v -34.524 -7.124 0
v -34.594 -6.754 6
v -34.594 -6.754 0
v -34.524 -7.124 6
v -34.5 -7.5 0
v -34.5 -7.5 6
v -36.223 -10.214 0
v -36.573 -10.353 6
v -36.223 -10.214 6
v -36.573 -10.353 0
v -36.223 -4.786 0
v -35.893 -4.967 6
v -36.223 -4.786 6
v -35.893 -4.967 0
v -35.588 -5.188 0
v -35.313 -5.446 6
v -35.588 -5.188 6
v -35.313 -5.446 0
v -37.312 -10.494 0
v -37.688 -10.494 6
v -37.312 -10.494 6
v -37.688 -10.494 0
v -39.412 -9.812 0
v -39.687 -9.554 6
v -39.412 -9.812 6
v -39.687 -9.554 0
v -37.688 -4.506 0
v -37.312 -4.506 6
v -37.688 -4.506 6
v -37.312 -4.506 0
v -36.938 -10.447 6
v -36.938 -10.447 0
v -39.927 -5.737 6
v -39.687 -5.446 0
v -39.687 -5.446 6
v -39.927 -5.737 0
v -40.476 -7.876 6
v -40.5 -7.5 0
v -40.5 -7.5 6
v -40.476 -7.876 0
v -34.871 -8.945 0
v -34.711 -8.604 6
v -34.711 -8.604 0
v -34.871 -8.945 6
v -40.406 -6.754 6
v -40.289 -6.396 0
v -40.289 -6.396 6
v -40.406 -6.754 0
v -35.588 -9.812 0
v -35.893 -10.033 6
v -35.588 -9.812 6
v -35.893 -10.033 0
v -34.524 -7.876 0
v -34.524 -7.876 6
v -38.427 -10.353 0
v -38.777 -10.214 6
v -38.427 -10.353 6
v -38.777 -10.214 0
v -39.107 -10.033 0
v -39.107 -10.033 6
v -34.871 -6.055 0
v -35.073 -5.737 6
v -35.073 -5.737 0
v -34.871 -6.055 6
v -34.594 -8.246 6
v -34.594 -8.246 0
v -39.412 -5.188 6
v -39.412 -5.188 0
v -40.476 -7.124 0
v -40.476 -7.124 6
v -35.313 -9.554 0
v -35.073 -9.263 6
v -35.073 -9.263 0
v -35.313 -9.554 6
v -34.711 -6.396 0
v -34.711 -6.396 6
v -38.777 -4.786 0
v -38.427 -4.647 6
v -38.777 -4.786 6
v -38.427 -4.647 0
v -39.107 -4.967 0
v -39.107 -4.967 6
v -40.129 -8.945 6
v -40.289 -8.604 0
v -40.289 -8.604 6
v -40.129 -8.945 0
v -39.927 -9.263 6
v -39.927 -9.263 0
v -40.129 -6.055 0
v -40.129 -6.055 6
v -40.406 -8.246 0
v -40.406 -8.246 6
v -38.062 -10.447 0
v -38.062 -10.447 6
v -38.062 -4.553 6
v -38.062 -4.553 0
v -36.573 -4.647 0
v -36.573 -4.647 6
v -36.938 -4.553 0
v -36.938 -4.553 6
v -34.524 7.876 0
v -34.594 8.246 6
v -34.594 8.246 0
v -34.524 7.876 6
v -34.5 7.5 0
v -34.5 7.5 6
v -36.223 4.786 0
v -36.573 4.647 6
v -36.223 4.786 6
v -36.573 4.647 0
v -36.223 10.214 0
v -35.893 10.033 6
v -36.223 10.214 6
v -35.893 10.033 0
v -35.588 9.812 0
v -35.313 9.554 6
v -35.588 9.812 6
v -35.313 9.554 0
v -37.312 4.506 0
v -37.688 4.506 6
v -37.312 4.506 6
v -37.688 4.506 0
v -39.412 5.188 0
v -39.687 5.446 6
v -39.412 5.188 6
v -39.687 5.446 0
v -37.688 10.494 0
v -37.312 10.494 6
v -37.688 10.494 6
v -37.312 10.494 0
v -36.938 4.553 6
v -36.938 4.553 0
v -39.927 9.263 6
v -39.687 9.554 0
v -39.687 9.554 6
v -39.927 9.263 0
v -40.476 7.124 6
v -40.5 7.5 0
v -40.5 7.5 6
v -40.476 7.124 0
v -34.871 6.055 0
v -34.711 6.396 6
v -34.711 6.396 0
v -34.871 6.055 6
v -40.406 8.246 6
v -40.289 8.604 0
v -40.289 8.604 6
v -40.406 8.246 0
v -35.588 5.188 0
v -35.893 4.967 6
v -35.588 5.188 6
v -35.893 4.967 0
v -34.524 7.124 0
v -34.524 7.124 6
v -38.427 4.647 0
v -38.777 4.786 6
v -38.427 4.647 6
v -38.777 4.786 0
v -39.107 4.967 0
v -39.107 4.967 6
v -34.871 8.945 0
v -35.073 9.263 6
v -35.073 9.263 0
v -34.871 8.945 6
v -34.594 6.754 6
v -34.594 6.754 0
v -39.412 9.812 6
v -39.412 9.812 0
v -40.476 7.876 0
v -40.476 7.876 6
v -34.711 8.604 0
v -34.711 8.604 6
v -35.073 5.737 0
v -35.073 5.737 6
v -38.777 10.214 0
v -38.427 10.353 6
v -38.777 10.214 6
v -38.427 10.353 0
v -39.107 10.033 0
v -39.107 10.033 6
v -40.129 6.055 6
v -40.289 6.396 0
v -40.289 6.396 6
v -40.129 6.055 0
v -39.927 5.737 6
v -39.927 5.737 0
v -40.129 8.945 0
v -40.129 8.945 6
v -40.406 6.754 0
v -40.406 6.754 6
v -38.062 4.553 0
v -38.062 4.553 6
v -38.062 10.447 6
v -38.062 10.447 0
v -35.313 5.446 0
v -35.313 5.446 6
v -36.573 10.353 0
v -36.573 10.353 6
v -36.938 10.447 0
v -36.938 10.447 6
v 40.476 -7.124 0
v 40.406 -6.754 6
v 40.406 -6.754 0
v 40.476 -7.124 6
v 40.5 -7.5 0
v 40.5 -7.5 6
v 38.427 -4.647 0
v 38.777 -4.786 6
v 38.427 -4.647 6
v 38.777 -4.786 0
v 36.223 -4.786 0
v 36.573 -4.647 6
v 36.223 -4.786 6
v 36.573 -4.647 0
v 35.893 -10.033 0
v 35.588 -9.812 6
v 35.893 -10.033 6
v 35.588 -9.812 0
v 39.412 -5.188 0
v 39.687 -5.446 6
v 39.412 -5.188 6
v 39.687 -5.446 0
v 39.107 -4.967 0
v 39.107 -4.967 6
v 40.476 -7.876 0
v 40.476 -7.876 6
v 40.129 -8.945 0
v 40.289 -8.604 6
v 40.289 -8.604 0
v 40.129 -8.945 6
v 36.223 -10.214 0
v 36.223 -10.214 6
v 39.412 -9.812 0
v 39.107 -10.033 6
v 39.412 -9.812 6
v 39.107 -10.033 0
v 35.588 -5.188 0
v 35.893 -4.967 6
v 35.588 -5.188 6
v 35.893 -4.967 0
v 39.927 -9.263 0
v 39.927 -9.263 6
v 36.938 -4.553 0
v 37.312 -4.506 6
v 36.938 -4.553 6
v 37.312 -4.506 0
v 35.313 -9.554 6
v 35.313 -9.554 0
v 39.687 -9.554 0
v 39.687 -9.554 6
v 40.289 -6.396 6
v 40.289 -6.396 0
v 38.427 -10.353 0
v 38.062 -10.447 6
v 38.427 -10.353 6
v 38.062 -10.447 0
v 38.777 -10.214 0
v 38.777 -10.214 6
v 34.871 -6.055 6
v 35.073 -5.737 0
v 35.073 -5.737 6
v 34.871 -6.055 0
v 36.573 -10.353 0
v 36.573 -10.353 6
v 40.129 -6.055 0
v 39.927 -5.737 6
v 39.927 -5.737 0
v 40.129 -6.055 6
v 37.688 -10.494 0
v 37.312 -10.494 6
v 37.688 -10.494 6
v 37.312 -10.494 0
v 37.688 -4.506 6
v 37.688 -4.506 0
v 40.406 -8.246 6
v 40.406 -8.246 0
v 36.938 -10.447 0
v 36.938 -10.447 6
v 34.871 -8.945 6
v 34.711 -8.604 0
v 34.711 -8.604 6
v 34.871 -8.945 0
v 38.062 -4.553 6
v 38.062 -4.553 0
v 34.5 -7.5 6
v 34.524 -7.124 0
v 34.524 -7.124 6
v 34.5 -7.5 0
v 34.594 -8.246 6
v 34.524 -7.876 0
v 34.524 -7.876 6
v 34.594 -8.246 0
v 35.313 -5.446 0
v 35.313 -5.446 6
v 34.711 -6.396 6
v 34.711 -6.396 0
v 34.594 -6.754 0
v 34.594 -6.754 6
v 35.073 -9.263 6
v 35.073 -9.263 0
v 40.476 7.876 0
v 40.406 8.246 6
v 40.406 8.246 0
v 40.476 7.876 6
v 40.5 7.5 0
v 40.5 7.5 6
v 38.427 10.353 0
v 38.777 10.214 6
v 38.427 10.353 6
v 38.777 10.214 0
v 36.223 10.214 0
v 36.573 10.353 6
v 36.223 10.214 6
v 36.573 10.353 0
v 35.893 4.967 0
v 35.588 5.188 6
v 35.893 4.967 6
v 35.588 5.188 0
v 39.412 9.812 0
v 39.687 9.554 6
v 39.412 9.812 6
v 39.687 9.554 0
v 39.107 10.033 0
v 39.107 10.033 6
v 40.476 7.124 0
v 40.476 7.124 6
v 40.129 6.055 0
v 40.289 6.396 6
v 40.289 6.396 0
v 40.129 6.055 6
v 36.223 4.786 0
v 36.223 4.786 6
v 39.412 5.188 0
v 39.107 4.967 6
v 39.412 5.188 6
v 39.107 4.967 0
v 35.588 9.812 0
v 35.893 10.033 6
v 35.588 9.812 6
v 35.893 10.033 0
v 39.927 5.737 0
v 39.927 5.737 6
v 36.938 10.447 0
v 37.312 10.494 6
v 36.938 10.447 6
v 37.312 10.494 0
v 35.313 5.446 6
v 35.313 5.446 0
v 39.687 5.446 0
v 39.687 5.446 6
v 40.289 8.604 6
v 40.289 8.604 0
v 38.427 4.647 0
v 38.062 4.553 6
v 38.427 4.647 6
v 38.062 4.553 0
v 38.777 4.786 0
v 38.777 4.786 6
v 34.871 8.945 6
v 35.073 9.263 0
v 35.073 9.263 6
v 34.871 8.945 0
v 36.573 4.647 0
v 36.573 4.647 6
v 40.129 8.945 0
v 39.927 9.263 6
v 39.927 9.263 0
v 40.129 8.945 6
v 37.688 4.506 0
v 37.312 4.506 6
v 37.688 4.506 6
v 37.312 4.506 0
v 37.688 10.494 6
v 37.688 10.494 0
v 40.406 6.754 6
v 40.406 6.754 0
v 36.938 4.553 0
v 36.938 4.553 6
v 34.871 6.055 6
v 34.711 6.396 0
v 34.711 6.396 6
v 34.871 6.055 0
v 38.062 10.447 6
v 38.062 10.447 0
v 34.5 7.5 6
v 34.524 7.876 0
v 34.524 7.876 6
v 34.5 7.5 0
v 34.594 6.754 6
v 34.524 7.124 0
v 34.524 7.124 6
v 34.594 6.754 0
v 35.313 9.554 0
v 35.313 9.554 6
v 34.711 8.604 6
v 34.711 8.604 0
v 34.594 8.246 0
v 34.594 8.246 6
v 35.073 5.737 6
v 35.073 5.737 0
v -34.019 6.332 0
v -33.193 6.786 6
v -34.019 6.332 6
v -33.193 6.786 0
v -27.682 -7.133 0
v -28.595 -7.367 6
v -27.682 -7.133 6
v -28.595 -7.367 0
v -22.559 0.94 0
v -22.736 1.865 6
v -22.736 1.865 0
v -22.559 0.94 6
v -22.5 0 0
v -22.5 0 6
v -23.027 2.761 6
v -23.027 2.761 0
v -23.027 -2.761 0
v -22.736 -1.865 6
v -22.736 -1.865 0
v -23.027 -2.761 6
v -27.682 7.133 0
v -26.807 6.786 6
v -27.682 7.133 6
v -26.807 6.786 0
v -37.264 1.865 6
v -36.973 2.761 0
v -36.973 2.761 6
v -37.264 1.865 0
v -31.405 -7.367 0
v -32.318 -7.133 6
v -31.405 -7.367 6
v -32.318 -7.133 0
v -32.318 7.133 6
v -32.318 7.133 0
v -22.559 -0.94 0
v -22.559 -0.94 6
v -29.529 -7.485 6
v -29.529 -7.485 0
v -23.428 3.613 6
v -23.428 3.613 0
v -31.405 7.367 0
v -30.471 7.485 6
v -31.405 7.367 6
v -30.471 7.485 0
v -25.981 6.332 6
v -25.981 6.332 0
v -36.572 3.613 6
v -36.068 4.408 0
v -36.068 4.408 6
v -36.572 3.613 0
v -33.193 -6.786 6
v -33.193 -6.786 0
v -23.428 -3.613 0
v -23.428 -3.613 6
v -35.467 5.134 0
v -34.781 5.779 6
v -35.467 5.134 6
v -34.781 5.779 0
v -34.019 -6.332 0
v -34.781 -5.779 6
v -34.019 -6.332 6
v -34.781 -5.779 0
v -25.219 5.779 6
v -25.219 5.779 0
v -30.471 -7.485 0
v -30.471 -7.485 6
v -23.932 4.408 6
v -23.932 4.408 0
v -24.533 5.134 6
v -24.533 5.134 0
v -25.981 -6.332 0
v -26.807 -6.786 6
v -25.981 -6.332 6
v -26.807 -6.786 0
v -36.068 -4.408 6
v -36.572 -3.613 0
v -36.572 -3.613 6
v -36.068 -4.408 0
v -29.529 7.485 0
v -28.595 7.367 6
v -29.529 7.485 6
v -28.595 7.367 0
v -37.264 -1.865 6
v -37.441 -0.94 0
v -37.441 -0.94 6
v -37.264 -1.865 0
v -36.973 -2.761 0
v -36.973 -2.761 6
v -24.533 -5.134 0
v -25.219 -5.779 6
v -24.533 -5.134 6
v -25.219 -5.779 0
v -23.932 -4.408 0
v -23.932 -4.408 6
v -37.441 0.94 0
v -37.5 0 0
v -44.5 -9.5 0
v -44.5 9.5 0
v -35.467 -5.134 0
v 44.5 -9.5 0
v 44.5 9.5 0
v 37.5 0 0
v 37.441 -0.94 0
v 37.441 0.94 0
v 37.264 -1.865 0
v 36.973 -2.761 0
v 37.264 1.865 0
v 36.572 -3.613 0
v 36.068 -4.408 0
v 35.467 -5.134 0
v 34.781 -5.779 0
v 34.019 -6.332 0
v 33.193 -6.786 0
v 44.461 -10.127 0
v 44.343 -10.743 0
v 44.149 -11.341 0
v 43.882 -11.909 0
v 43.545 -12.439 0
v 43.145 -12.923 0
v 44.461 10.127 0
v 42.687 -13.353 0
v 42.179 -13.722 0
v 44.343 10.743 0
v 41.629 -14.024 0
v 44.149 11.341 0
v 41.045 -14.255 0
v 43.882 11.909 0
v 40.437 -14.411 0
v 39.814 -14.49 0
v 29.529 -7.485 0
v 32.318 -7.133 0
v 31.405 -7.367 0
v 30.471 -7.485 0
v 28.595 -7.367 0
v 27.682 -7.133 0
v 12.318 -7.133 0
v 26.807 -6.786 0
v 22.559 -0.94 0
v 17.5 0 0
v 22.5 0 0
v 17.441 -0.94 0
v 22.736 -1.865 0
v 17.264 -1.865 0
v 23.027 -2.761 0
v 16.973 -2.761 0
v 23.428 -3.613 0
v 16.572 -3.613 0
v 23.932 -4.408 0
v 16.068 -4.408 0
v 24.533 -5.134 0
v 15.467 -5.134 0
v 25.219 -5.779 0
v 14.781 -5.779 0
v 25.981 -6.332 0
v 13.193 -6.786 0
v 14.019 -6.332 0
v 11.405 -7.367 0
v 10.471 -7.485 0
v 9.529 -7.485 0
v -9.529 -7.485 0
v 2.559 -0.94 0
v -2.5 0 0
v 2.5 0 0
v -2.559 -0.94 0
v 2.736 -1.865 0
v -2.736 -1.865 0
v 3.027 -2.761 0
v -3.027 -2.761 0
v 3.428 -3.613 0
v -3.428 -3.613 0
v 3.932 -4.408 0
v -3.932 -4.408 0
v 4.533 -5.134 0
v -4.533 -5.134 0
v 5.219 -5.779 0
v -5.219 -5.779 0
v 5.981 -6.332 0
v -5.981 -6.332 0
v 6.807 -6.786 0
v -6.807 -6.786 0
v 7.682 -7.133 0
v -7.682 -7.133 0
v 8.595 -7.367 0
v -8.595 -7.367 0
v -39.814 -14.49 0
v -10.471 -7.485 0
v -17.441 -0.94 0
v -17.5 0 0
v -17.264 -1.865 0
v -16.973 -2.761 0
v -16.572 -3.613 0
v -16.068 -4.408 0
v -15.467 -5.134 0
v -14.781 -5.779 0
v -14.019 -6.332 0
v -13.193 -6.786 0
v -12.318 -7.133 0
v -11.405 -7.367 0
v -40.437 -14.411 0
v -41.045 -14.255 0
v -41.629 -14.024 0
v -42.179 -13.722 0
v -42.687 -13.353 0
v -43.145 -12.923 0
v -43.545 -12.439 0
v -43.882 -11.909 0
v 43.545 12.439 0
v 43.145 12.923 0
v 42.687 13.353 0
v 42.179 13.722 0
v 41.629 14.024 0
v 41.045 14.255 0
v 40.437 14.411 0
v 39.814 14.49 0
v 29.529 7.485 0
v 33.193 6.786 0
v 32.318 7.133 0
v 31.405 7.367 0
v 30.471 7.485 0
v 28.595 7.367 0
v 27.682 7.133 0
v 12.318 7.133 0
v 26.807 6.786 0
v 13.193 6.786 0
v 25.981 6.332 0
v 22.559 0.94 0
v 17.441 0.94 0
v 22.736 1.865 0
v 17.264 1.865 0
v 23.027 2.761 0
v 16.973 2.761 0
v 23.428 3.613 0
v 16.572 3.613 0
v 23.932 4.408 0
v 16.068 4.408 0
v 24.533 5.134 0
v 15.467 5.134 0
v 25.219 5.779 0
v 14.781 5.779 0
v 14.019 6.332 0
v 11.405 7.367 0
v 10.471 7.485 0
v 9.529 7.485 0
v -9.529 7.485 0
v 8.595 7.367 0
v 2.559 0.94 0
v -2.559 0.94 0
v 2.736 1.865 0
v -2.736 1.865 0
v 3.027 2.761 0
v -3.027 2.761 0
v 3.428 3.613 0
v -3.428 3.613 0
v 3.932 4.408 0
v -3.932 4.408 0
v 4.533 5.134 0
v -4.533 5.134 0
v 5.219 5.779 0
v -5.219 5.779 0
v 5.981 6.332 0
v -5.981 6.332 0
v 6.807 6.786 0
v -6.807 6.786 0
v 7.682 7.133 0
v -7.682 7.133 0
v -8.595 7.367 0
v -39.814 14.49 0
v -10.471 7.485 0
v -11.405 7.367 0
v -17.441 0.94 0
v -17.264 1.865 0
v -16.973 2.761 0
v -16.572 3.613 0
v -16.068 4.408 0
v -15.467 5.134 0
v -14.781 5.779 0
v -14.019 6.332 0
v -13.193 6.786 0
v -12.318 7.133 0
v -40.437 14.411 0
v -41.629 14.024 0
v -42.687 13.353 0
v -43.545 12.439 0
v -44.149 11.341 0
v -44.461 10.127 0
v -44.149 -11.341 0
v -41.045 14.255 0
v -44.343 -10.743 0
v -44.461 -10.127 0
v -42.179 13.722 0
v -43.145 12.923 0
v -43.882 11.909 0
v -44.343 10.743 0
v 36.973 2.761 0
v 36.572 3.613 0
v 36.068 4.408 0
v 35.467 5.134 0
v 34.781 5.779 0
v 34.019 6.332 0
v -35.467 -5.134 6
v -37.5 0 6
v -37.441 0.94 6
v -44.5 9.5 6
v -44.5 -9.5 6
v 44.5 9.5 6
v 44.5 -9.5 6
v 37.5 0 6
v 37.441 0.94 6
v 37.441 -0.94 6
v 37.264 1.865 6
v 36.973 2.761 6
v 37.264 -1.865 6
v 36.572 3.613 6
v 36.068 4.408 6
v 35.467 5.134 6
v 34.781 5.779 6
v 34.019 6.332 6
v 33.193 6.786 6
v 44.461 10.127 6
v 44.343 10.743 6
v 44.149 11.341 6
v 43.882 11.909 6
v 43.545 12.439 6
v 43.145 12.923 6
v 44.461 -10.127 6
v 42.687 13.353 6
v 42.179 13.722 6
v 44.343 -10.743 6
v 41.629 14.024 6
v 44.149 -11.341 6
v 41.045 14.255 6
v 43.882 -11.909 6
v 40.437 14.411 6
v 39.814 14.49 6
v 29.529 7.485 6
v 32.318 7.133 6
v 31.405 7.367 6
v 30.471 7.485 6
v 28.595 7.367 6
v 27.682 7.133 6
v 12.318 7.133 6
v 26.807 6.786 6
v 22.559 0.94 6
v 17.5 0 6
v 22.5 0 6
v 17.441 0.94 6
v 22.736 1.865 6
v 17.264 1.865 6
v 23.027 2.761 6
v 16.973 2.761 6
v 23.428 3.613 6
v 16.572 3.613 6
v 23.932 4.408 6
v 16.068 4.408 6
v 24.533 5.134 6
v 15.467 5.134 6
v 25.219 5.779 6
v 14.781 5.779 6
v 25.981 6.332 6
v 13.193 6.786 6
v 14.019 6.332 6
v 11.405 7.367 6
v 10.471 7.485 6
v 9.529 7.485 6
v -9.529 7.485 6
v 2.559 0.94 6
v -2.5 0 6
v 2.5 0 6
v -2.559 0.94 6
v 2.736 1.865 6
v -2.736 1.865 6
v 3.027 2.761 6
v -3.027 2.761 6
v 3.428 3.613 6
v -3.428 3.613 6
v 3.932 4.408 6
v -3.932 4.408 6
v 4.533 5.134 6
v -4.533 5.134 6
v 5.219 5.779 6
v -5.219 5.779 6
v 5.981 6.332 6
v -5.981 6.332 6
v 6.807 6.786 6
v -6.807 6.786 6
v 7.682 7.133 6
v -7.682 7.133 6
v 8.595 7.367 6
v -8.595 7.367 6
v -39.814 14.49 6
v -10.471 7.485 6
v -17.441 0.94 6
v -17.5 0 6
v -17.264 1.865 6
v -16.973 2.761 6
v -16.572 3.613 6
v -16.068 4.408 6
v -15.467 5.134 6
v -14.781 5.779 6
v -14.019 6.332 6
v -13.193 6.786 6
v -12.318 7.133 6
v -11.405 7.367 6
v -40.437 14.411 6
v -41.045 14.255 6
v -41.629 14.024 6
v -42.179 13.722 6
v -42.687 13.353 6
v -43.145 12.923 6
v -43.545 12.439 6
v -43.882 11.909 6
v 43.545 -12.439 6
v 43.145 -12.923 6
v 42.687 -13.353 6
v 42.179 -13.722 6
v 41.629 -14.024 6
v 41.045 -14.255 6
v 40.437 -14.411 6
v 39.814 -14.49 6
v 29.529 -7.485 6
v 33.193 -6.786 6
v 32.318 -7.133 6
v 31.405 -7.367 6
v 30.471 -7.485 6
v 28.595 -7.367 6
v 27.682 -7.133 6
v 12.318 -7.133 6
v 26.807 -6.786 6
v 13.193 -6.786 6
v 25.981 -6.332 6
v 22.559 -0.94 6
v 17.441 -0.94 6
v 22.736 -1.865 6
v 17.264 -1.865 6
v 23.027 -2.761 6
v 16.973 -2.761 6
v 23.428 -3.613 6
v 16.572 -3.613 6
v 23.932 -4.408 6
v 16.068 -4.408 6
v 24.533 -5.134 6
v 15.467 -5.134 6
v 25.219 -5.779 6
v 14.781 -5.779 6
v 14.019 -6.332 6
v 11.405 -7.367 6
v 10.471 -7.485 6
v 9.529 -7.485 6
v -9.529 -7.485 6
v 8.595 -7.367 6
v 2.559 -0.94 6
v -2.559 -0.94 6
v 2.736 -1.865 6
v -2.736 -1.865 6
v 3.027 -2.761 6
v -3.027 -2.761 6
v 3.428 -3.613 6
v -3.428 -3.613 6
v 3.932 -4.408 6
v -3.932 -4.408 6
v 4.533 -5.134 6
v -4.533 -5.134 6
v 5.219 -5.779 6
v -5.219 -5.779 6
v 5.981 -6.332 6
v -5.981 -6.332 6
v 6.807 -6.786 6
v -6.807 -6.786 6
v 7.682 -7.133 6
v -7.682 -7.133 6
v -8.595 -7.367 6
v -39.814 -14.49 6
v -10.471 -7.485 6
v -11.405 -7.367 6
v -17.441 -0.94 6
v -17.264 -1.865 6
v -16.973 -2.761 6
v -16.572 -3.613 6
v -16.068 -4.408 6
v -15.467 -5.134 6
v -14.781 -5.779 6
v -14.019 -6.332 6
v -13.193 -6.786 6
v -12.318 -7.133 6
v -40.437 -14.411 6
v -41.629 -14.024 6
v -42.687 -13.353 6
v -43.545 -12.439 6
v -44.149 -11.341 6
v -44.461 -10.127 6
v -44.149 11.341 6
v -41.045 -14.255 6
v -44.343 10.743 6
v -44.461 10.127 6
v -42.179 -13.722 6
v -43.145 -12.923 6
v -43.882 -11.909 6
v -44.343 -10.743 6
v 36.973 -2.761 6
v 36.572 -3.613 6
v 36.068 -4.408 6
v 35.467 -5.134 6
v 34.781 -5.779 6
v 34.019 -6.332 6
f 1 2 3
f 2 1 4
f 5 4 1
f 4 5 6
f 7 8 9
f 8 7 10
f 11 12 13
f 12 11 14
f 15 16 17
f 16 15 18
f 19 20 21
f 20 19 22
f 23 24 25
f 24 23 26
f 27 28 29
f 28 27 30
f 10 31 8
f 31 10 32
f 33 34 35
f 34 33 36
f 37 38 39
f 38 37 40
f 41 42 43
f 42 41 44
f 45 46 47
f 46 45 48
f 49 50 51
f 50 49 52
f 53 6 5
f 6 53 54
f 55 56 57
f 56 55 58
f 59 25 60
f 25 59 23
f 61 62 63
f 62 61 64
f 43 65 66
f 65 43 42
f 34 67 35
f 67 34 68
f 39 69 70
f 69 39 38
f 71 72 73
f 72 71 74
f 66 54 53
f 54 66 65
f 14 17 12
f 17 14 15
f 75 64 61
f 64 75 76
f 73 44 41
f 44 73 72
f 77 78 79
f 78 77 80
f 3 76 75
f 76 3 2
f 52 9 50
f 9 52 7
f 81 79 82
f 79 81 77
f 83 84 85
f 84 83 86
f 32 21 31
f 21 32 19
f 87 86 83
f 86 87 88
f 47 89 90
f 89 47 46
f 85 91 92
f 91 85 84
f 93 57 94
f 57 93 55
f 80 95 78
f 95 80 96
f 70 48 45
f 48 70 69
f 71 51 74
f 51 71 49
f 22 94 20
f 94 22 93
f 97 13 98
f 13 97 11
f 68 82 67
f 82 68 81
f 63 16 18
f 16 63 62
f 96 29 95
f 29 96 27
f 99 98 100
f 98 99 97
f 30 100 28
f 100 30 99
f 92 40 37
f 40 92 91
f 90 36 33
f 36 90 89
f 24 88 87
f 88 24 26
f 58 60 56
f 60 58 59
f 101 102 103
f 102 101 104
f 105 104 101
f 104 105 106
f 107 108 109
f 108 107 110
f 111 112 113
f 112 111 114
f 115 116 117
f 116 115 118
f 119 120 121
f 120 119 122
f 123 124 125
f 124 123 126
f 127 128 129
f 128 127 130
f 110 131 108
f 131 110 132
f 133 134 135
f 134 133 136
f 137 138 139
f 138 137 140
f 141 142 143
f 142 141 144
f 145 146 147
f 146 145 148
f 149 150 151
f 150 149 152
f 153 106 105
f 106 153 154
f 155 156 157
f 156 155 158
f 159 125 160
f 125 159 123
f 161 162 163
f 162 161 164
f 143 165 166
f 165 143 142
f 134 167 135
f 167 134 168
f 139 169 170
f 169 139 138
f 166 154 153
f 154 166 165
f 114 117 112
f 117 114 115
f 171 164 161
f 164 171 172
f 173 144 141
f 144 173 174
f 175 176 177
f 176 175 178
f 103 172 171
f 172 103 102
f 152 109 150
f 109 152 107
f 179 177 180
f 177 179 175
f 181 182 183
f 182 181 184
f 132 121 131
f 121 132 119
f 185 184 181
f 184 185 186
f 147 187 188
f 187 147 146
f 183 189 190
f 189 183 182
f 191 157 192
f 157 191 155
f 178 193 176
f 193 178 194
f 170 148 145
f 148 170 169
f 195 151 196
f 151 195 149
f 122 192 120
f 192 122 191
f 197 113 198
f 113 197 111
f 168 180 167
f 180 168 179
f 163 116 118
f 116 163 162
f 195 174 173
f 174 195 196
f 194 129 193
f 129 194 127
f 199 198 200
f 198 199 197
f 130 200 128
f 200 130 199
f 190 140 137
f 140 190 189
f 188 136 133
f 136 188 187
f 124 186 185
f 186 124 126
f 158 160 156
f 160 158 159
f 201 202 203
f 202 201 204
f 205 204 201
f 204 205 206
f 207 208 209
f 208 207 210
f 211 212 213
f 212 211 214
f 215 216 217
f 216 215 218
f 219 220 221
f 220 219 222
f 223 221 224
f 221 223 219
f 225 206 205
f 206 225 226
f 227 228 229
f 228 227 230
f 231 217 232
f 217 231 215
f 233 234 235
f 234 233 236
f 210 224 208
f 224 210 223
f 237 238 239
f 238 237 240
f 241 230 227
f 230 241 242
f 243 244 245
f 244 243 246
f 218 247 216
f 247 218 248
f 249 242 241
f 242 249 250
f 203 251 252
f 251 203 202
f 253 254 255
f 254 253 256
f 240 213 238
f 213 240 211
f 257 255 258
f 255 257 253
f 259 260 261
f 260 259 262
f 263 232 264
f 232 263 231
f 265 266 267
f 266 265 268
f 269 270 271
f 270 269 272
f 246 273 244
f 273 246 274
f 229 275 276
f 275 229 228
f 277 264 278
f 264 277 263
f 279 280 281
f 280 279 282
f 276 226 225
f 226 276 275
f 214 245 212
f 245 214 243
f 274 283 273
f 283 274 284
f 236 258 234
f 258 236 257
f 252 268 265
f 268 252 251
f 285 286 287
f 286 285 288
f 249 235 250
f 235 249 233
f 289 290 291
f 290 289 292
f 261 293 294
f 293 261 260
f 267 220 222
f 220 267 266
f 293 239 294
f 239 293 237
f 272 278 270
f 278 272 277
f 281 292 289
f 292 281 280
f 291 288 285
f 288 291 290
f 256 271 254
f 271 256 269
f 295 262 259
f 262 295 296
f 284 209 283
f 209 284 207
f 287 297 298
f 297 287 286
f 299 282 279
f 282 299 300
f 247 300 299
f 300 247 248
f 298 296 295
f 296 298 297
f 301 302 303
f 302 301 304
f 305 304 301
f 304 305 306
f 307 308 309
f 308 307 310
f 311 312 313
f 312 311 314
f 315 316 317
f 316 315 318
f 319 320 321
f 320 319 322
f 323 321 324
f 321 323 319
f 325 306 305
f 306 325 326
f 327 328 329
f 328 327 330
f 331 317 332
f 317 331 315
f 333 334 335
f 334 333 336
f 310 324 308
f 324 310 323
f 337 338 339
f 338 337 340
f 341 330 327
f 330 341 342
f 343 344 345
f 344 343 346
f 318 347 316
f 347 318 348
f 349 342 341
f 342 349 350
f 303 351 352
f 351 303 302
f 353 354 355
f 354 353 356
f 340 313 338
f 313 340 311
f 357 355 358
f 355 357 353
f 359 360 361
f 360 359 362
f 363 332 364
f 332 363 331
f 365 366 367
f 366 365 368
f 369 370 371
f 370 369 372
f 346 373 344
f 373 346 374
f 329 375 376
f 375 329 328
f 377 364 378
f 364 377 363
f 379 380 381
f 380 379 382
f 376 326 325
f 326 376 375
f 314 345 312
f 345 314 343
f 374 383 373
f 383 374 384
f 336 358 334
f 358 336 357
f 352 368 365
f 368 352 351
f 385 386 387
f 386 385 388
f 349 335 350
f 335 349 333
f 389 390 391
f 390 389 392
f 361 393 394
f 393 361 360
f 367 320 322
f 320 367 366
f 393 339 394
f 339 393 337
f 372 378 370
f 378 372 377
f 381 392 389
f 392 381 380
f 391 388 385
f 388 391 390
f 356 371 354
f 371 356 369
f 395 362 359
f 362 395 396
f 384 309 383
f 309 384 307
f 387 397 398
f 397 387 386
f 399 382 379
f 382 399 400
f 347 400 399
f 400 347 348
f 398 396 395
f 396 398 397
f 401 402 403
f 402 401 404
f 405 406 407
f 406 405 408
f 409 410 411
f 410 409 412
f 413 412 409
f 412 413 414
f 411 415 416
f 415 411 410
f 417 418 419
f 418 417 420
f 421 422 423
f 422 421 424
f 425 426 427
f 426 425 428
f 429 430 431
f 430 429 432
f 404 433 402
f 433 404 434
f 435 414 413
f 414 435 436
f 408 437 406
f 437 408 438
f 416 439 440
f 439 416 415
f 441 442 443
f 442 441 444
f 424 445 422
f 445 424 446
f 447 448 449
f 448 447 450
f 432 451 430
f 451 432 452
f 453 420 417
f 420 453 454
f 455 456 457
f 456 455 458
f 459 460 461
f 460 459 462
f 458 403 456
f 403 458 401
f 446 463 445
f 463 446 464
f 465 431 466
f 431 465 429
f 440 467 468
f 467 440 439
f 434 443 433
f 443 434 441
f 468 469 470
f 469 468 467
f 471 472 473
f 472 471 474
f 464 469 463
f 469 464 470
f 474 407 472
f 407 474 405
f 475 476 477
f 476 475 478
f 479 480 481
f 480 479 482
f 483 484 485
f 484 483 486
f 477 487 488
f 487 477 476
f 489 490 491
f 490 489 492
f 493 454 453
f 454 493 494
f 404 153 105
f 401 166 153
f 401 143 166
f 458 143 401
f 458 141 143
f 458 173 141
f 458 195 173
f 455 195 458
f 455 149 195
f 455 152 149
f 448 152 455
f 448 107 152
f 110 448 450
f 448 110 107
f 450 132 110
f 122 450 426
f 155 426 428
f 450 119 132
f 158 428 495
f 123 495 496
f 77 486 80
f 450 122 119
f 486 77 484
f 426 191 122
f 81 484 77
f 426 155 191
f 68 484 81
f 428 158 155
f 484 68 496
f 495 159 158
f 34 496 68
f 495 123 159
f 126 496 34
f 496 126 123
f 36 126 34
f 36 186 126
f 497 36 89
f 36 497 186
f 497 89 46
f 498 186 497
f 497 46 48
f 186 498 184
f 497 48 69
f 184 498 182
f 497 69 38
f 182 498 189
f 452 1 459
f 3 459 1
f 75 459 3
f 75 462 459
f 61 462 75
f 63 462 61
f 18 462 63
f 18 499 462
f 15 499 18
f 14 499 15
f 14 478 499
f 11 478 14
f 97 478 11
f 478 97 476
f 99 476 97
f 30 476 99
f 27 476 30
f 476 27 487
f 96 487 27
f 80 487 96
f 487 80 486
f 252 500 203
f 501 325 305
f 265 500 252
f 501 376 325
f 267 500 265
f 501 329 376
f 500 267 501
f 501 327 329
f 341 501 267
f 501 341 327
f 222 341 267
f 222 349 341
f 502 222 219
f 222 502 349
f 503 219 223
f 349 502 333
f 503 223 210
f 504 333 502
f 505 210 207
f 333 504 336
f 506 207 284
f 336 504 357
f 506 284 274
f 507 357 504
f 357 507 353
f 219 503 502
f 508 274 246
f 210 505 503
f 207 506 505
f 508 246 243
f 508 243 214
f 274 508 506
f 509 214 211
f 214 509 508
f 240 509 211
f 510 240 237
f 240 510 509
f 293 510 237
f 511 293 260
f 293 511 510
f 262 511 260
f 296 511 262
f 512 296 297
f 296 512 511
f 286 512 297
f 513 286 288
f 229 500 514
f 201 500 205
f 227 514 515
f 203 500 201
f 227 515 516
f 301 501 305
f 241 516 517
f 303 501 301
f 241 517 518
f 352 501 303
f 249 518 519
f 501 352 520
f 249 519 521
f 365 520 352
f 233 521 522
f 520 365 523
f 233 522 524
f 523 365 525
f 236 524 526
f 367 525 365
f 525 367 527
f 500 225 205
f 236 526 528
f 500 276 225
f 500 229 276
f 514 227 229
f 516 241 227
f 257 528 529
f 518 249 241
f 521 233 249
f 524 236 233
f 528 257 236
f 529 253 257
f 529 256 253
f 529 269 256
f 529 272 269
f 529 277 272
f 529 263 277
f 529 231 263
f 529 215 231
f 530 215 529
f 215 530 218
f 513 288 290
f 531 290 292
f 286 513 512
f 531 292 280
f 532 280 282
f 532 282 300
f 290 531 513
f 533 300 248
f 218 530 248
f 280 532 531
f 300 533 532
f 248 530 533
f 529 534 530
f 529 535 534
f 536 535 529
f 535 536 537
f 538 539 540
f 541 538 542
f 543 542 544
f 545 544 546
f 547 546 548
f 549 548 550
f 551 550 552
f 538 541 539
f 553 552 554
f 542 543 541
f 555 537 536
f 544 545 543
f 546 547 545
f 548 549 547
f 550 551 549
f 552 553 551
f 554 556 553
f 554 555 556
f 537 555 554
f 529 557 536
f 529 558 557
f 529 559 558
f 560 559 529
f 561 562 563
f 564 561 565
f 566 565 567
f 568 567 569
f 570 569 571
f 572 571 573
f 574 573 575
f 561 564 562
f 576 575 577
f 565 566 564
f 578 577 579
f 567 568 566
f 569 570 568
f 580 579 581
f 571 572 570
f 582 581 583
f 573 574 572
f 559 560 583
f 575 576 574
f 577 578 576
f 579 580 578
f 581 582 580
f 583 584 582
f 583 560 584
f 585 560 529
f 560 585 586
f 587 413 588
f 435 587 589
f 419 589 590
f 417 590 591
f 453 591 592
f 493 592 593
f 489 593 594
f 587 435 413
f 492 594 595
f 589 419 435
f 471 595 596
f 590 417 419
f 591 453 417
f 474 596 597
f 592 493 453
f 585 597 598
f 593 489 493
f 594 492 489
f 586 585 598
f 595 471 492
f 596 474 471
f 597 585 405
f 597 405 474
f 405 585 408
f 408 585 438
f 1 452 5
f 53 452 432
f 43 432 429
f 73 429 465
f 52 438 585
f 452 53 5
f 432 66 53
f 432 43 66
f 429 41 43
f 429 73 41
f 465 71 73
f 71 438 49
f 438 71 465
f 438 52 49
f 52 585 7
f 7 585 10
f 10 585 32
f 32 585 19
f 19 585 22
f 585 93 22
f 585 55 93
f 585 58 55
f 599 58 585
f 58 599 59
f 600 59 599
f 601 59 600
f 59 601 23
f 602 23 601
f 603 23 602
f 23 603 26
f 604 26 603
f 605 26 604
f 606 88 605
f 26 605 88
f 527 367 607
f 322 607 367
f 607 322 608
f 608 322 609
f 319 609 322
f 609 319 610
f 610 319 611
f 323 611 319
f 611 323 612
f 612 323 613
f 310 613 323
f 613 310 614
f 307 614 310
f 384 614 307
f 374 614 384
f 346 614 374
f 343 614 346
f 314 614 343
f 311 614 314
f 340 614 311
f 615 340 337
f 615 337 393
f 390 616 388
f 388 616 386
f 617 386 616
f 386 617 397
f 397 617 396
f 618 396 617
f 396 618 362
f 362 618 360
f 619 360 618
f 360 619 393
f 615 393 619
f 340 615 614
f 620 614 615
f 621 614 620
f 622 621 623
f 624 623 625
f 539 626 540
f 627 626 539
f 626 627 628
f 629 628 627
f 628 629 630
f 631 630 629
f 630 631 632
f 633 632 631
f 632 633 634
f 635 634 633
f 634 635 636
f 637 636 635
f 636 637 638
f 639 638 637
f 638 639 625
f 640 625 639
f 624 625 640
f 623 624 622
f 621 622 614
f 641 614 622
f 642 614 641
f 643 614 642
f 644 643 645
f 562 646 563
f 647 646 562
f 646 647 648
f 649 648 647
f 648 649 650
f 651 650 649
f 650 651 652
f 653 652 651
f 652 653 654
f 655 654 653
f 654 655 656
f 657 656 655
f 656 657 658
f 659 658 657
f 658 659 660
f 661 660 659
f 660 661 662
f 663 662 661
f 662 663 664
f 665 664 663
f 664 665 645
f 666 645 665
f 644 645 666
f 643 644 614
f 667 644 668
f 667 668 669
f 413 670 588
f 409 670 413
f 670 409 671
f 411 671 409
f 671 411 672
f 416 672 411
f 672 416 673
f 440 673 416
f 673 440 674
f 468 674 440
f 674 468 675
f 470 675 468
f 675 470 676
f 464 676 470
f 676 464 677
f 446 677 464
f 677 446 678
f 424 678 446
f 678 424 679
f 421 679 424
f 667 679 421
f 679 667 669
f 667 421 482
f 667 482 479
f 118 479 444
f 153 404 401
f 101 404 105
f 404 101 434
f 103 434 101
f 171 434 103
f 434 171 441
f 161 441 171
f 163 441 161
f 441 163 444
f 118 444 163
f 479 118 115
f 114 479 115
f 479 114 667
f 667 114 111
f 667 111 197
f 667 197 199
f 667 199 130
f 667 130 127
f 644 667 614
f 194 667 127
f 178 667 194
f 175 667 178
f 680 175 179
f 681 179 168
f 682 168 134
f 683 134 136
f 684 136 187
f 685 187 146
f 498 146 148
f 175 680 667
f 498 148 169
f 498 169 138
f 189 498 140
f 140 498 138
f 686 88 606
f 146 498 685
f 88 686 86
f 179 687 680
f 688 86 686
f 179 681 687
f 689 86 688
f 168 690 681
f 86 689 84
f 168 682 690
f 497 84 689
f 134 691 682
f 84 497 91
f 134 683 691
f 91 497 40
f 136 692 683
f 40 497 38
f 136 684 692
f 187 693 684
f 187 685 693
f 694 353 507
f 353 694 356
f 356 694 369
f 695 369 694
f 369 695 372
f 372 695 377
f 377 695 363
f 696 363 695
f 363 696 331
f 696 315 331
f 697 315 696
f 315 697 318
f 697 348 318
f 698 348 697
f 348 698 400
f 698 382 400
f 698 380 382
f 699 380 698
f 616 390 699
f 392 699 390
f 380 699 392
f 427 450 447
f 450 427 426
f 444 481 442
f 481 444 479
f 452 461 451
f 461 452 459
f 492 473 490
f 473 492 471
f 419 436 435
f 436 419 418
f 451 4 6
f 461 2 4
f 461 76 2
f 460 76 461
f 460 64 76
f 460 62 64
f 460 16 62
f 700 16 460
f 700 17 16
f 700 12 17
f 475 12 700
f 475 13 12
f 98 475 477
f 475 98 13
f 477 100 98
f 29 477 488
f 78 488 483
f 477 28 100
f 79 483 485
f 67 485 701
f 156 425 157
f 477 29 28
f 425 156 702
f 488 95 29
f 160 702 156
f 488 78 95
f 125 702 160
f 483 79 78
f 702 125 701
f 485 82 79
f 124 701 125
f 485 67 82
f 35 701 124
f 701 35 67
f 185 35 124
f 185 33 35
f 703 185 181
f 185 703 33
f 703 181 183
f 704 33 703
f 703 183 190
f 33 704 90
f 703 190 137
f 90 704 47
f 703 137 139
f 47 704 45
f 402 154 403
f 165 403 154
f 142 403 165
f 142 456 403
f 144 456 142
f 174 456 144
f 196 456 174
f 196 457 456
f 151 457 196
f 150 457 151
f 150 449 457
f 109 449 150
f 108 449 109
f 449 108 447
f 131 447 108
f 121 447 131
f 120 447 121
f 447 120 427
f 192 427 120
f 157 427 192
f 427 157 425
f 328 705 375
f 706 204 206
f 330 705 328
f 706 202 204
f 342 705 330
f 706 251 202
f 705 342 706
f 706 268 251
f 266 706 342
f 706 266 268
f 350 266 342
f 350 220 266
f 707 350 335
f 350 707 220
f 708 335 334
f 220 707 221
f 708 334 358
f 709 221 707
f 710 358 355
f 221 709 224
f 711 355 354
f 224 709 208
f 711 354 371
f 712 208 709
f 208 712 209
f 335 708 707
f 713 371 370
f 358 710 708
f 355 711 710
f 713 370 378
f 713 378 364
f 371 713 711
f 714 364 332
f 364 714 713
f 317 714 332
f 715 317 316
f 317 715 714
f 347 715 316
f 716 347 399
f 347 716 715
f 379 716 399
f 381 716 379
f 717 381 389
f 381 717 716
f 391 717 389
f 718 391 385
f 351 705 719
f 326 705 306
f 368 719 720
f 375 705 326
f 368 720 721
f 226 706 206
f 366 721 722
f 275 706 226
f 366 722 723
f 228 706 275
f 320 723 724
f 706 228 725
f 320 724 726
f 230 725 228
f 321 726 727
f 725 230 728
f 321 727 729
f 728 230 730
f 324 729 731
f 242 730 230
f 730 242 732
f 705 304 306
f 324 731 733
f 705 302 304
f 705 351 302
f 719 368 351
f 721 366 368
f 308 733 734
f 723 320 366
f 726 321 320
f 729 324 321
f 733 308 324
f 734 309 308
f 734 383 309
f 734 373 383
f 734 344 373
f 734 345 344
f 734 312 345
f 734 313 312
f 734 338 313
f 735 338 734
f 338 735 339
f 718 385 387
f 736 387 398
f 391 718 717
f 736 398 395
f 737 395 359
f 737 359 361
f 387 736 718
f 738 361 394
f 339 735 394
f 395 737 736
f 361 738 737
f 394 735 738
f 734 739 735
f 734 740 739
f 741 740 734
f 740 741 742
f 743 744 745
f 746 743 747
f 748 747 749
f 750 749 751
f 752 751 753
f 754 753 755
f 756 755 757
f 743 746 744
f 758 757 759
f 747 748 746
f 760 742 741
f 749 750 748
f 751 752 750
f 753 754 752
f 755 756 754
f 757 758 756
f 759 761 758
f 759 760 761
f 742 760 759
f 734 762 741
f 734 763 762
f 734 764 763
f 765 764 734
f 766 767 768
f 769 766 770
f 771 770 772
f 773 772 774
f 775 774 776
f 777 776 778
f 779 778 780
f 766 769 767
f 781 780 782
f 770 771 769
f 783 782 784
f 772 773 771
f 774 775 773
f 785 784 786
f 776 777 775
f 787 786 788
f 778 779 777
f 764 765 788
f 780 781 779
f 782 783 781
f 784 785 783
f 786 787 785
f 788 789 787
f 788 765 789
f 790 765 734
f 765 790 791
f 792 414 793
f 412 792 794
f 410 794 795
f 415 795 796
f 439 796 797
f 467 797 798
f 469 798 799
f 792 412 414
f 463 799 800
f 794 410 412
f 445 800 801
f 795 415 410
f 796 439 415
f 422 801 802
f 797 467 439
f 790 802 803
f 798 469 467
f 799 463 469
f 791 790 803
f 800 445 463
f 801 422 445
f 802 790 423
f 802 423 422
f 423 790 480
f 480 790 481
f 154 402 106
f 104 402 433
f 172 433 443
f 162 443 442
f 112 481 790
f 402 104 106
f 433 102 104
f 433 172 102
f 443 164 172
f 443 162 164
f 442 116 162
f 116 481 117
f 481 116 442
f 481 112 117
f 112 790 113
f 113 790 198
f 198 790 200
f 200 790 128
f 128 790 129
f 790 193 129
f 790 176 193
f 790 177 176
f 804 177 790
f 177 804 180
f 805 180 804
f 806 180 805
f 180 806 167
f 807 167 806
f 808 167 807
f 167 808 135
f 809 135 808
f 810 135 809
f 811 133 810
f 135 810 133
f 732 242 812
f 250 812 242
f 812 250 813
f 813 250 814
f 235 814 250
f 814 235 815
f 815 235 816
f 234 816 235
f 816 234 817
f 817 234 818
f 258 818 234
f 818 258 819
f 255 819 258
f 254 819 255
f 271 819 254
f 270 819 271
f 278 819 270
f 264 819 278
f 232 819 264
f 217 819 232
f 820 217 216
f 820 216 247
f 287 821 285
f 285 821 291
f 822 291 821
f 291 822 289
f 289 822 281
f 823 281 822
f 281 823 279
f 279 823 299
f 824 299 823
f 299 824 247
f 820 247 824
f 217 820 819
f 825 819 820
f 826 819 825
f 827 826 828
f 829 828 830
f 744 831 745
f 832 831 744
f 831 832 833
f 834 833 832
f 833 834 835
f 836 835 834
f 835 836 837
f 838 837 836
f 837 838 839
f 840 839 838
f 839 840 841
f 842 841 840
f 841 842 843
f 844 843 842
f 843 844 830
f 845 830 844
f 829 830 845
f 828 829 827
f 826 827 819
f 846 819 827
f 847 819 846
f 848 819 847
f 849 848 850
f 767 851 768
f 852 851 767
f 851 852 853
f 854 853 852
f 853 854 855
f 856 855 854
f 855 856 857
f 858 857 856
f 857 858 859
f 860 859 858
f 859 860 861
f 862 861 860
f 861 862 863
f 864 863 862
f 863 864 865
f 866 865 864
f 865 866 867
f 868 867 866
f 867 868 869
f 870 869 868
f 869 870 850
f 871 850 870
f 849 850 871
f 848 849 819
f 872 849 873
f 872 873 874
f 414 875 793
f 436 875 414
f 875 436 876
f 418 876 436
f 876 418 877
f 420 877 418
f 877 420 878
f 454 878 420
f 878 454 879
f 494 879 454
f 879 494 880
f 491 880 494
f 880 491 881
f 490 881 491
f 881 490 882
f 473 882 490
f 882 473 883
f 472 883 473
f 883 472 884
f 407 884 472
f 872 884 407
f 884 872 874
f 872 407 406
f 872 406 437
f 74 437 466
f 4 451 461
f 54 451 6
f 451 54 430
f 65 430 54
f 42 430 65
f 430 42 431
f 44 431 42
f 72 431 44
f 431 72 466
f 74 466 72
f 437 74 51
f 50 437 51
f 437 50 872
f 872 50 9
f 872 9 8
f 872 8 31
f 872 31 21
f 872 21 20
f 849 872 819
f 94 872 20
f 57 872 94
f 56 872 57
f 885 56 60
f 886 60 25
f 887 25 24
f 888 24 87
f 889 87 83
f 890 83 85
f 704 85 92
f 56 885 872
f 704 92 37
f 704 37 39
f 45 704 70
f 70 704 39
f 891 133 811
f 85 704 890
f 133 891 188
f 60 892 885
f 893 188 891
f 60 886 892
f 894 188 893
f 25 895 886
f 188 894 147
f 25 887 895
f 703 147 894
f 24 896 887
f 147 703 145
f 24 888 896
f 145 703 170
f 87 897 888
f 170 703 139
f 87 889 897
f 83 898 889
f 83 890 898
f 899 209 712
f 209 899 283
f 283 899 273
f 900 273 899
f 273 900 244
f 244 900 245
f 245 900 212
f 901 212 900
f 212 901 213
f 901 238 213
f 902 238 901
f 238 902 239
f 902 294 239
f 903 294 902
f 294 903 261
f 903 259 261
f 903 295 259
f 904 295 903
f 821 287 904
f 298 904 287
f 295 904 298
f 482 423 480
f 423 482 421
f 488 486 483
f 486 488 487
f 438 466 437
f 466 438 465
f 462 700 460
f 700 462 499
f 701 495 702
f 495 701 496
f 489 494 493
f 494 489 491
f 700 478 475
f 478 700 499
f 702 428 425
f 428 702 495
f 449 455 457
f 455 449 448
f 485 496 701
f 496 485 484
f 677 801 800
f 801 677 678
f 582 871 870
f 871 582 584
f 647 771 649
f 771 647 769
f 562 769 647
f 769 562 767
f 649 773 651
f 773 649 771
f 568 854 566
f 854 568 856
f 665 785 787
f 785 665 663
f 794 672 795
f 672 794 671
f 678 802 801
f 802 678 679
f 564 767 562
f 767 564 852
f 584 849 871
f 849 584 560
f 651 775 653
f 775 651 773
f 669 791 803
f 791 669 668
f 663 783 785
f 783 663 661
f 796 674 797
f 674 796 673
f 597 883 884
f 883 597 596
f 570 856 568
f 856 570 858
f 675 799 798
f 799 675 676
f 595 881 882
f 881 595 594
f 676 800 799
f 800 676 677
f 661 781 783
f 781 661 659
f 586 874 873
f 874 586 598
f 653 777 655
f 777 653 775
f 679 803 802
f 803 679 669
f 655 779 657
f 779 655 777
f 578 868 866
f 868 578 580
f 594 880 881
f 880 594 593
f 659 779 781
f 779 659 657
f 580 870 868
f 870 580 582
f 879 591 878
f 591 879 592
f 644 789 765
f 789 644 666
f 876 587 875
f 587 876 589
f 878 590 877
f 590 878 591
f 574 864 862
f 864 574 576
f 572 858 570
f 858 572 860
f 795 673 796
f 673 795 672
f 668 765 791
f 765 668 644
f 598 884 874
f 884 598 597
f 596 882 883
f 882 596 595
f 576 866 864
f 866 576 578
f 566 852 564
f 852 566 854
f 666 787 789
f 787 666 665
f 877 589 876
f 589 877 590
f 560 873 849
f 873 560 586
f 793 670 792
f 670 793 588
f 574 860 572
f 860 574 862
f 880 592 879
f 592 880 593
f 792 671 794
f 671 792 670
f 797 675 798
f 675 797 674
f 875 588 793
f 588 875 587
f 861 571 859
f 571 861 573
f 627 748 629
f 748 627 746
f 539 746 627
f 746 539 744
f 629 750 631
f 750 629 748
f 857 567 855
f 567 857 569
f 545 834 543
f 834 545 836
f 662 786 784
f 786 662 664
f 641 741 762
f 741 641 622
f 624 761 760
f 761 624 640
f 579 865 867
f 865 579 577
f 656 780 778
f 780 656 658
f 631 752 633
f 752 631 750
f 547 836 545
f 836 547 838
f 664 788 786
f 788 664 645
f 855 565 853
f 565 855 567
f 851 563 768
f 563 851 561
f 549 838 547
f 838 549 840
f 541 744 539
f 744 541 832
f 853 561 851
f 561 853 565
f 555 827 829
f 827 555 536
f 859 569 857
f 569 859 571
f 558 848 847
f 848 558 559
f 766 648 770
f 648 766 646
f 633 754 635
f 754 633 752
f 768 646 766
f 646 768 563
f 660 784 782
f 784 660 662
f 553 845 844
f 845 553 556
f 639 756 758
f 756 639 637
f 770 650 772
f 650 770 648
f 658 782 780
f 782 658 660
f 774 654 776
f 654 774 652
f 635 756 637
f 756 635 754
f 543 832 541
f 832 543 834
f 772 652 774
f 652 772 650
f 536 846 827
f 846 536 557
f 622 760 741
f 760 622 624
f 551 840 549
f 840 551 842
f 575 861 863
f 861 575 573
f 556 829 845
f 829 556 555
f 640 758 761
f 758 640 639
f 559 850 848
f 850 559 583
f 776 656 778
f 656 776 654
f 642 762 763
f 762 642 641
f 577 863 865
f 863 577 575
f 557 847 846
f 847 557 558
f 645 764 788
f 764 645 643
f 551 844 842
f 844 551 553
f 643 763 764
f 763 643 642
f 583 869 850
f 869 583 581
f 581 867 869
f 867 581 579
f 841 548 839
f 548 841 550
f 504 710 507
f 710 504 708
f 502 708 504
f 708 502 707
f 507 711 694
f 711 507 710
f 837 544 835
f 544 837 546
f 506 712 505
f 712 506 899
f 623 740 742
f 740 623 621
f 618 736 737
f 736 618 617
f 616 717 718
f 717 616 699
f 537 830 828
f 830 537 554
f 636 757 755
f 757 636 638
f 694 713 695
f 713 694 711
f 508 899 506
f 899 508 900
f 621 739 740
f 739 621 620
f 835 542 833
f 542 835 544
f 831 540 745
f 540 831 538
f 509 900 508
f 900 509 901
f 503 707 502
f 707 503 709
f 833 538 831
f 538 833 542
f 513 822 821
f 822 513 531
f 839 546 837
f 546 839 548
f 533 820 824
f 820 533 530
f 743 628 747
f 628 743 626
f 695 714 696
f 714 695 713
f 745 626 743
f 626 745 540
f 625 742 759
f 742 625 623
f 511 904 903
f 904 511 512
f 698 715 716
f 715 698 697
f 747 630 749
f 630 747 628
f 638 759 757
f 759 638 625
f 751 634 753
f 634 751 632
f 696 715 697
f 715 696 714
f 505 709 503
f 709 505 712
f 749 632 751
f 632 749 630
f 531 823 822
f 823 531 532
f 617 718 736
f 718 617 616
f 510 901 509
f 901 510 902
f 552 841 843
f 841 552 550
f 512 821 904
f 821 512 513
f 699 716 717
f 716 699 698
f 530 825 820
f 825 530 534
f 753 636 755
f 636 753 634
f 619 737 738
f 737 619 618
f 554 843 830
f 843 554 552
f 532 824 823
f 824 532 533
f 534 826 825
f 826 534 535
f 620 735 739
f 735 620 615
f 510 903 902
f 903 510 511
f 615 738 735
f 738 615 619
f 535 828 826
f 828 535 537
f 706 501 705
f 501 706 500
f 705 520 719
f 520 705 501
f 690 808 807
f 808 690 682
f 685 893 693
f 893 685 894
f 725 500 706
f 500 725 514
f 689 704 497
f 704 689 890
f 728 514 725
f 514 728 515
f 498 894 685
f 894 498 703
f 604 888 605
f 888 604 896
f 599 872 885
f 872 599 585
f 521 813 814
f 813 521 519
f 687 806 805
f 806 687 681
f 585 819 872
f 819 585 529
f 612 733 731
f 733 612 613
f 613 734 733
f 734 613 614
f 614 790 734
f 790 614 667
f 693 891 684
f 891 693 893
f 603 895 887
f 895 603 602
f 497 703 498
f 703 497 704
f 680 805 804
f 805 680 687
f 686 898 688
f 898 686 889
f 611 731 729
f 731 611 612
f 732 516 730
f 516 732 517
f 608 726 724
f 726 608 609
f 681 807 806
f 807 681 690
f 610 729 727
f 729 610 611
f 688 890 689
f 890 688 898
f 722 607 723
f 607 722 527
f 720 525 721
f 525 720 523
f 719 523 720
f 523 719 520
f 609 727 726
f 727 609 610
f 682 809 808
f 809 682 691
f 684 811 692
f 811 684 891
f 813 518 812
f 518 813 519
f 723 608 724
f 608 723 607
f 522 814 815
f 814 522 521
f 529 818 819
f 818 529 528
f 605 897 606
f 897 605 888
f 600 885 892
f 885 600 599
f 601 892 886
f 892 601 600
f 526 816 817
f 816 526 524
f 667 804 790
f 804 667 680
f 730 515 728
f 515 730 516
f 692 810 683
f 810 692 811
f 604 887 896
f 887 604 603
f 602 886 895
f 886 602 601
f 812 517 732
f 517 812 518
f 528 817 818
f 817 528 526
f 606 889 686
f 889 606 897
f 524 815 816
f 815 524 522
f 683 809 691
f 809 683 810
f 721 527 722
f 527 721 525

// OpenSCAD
$fn = 50;


difference() {
	union() {
		hull() {
			translate(v = [-39.5000000000, 9.5000000000, 0]) {
				cylinder(h = 6, r = 5);
			}
			translate(v = [39.5000000000, 9.5000000000, 0]) {
				cylinder(h = 6, r = 5);
			}
			translate(v = [-39.5000000000, -9.5000000000, 0]) {
				cylinder(h = 6, r = 5);
			}
			translate(v = [39.5000000000, -9.5000000000, 0]) {
				cylinder(h = 6, r = 5);
			}
		}
	}
	union() {
		#translate(v = [-37.5000000000, -7.5000000000, -100.0000000000]) {
			cylinder(h = 200, r = 3.0000000000);
		}
		#translate(v = [-37.5000000000, 7.5000000000, -100.0000000000]) {
			cylinder(h = 200, r = 3.0000000000);
		}
		#translate(v = [37.5000000000, -7.5000000000, -100.0000000000]) {
			cylinder(h = 200, r = 3.0000000000);
		}
		#translate(v = [37.5000000000, 7.5000000000, -100.0000000000]) {
			cylinder(h = 200, r = 3.0000000000);
		}
		#translate(v = [-30.0000000000, 0, 0]) {
			cylinder(h = 6, r = 7.5000000000);
		}
		#translate(v = [-10.0000000000, 0, 0]) {
			cylinder(h = 6, r = 7.5000000000);
		}
		#translate(v = [10.0000000000, 0, 0]) {
			cylinder(h = 6, r = 7.5000000000);
		}
		#translate(v = [30.0000000000, 0, 0]) {
			cylinder(h = 6, r = 7.5000000000);
		}
	}
}
